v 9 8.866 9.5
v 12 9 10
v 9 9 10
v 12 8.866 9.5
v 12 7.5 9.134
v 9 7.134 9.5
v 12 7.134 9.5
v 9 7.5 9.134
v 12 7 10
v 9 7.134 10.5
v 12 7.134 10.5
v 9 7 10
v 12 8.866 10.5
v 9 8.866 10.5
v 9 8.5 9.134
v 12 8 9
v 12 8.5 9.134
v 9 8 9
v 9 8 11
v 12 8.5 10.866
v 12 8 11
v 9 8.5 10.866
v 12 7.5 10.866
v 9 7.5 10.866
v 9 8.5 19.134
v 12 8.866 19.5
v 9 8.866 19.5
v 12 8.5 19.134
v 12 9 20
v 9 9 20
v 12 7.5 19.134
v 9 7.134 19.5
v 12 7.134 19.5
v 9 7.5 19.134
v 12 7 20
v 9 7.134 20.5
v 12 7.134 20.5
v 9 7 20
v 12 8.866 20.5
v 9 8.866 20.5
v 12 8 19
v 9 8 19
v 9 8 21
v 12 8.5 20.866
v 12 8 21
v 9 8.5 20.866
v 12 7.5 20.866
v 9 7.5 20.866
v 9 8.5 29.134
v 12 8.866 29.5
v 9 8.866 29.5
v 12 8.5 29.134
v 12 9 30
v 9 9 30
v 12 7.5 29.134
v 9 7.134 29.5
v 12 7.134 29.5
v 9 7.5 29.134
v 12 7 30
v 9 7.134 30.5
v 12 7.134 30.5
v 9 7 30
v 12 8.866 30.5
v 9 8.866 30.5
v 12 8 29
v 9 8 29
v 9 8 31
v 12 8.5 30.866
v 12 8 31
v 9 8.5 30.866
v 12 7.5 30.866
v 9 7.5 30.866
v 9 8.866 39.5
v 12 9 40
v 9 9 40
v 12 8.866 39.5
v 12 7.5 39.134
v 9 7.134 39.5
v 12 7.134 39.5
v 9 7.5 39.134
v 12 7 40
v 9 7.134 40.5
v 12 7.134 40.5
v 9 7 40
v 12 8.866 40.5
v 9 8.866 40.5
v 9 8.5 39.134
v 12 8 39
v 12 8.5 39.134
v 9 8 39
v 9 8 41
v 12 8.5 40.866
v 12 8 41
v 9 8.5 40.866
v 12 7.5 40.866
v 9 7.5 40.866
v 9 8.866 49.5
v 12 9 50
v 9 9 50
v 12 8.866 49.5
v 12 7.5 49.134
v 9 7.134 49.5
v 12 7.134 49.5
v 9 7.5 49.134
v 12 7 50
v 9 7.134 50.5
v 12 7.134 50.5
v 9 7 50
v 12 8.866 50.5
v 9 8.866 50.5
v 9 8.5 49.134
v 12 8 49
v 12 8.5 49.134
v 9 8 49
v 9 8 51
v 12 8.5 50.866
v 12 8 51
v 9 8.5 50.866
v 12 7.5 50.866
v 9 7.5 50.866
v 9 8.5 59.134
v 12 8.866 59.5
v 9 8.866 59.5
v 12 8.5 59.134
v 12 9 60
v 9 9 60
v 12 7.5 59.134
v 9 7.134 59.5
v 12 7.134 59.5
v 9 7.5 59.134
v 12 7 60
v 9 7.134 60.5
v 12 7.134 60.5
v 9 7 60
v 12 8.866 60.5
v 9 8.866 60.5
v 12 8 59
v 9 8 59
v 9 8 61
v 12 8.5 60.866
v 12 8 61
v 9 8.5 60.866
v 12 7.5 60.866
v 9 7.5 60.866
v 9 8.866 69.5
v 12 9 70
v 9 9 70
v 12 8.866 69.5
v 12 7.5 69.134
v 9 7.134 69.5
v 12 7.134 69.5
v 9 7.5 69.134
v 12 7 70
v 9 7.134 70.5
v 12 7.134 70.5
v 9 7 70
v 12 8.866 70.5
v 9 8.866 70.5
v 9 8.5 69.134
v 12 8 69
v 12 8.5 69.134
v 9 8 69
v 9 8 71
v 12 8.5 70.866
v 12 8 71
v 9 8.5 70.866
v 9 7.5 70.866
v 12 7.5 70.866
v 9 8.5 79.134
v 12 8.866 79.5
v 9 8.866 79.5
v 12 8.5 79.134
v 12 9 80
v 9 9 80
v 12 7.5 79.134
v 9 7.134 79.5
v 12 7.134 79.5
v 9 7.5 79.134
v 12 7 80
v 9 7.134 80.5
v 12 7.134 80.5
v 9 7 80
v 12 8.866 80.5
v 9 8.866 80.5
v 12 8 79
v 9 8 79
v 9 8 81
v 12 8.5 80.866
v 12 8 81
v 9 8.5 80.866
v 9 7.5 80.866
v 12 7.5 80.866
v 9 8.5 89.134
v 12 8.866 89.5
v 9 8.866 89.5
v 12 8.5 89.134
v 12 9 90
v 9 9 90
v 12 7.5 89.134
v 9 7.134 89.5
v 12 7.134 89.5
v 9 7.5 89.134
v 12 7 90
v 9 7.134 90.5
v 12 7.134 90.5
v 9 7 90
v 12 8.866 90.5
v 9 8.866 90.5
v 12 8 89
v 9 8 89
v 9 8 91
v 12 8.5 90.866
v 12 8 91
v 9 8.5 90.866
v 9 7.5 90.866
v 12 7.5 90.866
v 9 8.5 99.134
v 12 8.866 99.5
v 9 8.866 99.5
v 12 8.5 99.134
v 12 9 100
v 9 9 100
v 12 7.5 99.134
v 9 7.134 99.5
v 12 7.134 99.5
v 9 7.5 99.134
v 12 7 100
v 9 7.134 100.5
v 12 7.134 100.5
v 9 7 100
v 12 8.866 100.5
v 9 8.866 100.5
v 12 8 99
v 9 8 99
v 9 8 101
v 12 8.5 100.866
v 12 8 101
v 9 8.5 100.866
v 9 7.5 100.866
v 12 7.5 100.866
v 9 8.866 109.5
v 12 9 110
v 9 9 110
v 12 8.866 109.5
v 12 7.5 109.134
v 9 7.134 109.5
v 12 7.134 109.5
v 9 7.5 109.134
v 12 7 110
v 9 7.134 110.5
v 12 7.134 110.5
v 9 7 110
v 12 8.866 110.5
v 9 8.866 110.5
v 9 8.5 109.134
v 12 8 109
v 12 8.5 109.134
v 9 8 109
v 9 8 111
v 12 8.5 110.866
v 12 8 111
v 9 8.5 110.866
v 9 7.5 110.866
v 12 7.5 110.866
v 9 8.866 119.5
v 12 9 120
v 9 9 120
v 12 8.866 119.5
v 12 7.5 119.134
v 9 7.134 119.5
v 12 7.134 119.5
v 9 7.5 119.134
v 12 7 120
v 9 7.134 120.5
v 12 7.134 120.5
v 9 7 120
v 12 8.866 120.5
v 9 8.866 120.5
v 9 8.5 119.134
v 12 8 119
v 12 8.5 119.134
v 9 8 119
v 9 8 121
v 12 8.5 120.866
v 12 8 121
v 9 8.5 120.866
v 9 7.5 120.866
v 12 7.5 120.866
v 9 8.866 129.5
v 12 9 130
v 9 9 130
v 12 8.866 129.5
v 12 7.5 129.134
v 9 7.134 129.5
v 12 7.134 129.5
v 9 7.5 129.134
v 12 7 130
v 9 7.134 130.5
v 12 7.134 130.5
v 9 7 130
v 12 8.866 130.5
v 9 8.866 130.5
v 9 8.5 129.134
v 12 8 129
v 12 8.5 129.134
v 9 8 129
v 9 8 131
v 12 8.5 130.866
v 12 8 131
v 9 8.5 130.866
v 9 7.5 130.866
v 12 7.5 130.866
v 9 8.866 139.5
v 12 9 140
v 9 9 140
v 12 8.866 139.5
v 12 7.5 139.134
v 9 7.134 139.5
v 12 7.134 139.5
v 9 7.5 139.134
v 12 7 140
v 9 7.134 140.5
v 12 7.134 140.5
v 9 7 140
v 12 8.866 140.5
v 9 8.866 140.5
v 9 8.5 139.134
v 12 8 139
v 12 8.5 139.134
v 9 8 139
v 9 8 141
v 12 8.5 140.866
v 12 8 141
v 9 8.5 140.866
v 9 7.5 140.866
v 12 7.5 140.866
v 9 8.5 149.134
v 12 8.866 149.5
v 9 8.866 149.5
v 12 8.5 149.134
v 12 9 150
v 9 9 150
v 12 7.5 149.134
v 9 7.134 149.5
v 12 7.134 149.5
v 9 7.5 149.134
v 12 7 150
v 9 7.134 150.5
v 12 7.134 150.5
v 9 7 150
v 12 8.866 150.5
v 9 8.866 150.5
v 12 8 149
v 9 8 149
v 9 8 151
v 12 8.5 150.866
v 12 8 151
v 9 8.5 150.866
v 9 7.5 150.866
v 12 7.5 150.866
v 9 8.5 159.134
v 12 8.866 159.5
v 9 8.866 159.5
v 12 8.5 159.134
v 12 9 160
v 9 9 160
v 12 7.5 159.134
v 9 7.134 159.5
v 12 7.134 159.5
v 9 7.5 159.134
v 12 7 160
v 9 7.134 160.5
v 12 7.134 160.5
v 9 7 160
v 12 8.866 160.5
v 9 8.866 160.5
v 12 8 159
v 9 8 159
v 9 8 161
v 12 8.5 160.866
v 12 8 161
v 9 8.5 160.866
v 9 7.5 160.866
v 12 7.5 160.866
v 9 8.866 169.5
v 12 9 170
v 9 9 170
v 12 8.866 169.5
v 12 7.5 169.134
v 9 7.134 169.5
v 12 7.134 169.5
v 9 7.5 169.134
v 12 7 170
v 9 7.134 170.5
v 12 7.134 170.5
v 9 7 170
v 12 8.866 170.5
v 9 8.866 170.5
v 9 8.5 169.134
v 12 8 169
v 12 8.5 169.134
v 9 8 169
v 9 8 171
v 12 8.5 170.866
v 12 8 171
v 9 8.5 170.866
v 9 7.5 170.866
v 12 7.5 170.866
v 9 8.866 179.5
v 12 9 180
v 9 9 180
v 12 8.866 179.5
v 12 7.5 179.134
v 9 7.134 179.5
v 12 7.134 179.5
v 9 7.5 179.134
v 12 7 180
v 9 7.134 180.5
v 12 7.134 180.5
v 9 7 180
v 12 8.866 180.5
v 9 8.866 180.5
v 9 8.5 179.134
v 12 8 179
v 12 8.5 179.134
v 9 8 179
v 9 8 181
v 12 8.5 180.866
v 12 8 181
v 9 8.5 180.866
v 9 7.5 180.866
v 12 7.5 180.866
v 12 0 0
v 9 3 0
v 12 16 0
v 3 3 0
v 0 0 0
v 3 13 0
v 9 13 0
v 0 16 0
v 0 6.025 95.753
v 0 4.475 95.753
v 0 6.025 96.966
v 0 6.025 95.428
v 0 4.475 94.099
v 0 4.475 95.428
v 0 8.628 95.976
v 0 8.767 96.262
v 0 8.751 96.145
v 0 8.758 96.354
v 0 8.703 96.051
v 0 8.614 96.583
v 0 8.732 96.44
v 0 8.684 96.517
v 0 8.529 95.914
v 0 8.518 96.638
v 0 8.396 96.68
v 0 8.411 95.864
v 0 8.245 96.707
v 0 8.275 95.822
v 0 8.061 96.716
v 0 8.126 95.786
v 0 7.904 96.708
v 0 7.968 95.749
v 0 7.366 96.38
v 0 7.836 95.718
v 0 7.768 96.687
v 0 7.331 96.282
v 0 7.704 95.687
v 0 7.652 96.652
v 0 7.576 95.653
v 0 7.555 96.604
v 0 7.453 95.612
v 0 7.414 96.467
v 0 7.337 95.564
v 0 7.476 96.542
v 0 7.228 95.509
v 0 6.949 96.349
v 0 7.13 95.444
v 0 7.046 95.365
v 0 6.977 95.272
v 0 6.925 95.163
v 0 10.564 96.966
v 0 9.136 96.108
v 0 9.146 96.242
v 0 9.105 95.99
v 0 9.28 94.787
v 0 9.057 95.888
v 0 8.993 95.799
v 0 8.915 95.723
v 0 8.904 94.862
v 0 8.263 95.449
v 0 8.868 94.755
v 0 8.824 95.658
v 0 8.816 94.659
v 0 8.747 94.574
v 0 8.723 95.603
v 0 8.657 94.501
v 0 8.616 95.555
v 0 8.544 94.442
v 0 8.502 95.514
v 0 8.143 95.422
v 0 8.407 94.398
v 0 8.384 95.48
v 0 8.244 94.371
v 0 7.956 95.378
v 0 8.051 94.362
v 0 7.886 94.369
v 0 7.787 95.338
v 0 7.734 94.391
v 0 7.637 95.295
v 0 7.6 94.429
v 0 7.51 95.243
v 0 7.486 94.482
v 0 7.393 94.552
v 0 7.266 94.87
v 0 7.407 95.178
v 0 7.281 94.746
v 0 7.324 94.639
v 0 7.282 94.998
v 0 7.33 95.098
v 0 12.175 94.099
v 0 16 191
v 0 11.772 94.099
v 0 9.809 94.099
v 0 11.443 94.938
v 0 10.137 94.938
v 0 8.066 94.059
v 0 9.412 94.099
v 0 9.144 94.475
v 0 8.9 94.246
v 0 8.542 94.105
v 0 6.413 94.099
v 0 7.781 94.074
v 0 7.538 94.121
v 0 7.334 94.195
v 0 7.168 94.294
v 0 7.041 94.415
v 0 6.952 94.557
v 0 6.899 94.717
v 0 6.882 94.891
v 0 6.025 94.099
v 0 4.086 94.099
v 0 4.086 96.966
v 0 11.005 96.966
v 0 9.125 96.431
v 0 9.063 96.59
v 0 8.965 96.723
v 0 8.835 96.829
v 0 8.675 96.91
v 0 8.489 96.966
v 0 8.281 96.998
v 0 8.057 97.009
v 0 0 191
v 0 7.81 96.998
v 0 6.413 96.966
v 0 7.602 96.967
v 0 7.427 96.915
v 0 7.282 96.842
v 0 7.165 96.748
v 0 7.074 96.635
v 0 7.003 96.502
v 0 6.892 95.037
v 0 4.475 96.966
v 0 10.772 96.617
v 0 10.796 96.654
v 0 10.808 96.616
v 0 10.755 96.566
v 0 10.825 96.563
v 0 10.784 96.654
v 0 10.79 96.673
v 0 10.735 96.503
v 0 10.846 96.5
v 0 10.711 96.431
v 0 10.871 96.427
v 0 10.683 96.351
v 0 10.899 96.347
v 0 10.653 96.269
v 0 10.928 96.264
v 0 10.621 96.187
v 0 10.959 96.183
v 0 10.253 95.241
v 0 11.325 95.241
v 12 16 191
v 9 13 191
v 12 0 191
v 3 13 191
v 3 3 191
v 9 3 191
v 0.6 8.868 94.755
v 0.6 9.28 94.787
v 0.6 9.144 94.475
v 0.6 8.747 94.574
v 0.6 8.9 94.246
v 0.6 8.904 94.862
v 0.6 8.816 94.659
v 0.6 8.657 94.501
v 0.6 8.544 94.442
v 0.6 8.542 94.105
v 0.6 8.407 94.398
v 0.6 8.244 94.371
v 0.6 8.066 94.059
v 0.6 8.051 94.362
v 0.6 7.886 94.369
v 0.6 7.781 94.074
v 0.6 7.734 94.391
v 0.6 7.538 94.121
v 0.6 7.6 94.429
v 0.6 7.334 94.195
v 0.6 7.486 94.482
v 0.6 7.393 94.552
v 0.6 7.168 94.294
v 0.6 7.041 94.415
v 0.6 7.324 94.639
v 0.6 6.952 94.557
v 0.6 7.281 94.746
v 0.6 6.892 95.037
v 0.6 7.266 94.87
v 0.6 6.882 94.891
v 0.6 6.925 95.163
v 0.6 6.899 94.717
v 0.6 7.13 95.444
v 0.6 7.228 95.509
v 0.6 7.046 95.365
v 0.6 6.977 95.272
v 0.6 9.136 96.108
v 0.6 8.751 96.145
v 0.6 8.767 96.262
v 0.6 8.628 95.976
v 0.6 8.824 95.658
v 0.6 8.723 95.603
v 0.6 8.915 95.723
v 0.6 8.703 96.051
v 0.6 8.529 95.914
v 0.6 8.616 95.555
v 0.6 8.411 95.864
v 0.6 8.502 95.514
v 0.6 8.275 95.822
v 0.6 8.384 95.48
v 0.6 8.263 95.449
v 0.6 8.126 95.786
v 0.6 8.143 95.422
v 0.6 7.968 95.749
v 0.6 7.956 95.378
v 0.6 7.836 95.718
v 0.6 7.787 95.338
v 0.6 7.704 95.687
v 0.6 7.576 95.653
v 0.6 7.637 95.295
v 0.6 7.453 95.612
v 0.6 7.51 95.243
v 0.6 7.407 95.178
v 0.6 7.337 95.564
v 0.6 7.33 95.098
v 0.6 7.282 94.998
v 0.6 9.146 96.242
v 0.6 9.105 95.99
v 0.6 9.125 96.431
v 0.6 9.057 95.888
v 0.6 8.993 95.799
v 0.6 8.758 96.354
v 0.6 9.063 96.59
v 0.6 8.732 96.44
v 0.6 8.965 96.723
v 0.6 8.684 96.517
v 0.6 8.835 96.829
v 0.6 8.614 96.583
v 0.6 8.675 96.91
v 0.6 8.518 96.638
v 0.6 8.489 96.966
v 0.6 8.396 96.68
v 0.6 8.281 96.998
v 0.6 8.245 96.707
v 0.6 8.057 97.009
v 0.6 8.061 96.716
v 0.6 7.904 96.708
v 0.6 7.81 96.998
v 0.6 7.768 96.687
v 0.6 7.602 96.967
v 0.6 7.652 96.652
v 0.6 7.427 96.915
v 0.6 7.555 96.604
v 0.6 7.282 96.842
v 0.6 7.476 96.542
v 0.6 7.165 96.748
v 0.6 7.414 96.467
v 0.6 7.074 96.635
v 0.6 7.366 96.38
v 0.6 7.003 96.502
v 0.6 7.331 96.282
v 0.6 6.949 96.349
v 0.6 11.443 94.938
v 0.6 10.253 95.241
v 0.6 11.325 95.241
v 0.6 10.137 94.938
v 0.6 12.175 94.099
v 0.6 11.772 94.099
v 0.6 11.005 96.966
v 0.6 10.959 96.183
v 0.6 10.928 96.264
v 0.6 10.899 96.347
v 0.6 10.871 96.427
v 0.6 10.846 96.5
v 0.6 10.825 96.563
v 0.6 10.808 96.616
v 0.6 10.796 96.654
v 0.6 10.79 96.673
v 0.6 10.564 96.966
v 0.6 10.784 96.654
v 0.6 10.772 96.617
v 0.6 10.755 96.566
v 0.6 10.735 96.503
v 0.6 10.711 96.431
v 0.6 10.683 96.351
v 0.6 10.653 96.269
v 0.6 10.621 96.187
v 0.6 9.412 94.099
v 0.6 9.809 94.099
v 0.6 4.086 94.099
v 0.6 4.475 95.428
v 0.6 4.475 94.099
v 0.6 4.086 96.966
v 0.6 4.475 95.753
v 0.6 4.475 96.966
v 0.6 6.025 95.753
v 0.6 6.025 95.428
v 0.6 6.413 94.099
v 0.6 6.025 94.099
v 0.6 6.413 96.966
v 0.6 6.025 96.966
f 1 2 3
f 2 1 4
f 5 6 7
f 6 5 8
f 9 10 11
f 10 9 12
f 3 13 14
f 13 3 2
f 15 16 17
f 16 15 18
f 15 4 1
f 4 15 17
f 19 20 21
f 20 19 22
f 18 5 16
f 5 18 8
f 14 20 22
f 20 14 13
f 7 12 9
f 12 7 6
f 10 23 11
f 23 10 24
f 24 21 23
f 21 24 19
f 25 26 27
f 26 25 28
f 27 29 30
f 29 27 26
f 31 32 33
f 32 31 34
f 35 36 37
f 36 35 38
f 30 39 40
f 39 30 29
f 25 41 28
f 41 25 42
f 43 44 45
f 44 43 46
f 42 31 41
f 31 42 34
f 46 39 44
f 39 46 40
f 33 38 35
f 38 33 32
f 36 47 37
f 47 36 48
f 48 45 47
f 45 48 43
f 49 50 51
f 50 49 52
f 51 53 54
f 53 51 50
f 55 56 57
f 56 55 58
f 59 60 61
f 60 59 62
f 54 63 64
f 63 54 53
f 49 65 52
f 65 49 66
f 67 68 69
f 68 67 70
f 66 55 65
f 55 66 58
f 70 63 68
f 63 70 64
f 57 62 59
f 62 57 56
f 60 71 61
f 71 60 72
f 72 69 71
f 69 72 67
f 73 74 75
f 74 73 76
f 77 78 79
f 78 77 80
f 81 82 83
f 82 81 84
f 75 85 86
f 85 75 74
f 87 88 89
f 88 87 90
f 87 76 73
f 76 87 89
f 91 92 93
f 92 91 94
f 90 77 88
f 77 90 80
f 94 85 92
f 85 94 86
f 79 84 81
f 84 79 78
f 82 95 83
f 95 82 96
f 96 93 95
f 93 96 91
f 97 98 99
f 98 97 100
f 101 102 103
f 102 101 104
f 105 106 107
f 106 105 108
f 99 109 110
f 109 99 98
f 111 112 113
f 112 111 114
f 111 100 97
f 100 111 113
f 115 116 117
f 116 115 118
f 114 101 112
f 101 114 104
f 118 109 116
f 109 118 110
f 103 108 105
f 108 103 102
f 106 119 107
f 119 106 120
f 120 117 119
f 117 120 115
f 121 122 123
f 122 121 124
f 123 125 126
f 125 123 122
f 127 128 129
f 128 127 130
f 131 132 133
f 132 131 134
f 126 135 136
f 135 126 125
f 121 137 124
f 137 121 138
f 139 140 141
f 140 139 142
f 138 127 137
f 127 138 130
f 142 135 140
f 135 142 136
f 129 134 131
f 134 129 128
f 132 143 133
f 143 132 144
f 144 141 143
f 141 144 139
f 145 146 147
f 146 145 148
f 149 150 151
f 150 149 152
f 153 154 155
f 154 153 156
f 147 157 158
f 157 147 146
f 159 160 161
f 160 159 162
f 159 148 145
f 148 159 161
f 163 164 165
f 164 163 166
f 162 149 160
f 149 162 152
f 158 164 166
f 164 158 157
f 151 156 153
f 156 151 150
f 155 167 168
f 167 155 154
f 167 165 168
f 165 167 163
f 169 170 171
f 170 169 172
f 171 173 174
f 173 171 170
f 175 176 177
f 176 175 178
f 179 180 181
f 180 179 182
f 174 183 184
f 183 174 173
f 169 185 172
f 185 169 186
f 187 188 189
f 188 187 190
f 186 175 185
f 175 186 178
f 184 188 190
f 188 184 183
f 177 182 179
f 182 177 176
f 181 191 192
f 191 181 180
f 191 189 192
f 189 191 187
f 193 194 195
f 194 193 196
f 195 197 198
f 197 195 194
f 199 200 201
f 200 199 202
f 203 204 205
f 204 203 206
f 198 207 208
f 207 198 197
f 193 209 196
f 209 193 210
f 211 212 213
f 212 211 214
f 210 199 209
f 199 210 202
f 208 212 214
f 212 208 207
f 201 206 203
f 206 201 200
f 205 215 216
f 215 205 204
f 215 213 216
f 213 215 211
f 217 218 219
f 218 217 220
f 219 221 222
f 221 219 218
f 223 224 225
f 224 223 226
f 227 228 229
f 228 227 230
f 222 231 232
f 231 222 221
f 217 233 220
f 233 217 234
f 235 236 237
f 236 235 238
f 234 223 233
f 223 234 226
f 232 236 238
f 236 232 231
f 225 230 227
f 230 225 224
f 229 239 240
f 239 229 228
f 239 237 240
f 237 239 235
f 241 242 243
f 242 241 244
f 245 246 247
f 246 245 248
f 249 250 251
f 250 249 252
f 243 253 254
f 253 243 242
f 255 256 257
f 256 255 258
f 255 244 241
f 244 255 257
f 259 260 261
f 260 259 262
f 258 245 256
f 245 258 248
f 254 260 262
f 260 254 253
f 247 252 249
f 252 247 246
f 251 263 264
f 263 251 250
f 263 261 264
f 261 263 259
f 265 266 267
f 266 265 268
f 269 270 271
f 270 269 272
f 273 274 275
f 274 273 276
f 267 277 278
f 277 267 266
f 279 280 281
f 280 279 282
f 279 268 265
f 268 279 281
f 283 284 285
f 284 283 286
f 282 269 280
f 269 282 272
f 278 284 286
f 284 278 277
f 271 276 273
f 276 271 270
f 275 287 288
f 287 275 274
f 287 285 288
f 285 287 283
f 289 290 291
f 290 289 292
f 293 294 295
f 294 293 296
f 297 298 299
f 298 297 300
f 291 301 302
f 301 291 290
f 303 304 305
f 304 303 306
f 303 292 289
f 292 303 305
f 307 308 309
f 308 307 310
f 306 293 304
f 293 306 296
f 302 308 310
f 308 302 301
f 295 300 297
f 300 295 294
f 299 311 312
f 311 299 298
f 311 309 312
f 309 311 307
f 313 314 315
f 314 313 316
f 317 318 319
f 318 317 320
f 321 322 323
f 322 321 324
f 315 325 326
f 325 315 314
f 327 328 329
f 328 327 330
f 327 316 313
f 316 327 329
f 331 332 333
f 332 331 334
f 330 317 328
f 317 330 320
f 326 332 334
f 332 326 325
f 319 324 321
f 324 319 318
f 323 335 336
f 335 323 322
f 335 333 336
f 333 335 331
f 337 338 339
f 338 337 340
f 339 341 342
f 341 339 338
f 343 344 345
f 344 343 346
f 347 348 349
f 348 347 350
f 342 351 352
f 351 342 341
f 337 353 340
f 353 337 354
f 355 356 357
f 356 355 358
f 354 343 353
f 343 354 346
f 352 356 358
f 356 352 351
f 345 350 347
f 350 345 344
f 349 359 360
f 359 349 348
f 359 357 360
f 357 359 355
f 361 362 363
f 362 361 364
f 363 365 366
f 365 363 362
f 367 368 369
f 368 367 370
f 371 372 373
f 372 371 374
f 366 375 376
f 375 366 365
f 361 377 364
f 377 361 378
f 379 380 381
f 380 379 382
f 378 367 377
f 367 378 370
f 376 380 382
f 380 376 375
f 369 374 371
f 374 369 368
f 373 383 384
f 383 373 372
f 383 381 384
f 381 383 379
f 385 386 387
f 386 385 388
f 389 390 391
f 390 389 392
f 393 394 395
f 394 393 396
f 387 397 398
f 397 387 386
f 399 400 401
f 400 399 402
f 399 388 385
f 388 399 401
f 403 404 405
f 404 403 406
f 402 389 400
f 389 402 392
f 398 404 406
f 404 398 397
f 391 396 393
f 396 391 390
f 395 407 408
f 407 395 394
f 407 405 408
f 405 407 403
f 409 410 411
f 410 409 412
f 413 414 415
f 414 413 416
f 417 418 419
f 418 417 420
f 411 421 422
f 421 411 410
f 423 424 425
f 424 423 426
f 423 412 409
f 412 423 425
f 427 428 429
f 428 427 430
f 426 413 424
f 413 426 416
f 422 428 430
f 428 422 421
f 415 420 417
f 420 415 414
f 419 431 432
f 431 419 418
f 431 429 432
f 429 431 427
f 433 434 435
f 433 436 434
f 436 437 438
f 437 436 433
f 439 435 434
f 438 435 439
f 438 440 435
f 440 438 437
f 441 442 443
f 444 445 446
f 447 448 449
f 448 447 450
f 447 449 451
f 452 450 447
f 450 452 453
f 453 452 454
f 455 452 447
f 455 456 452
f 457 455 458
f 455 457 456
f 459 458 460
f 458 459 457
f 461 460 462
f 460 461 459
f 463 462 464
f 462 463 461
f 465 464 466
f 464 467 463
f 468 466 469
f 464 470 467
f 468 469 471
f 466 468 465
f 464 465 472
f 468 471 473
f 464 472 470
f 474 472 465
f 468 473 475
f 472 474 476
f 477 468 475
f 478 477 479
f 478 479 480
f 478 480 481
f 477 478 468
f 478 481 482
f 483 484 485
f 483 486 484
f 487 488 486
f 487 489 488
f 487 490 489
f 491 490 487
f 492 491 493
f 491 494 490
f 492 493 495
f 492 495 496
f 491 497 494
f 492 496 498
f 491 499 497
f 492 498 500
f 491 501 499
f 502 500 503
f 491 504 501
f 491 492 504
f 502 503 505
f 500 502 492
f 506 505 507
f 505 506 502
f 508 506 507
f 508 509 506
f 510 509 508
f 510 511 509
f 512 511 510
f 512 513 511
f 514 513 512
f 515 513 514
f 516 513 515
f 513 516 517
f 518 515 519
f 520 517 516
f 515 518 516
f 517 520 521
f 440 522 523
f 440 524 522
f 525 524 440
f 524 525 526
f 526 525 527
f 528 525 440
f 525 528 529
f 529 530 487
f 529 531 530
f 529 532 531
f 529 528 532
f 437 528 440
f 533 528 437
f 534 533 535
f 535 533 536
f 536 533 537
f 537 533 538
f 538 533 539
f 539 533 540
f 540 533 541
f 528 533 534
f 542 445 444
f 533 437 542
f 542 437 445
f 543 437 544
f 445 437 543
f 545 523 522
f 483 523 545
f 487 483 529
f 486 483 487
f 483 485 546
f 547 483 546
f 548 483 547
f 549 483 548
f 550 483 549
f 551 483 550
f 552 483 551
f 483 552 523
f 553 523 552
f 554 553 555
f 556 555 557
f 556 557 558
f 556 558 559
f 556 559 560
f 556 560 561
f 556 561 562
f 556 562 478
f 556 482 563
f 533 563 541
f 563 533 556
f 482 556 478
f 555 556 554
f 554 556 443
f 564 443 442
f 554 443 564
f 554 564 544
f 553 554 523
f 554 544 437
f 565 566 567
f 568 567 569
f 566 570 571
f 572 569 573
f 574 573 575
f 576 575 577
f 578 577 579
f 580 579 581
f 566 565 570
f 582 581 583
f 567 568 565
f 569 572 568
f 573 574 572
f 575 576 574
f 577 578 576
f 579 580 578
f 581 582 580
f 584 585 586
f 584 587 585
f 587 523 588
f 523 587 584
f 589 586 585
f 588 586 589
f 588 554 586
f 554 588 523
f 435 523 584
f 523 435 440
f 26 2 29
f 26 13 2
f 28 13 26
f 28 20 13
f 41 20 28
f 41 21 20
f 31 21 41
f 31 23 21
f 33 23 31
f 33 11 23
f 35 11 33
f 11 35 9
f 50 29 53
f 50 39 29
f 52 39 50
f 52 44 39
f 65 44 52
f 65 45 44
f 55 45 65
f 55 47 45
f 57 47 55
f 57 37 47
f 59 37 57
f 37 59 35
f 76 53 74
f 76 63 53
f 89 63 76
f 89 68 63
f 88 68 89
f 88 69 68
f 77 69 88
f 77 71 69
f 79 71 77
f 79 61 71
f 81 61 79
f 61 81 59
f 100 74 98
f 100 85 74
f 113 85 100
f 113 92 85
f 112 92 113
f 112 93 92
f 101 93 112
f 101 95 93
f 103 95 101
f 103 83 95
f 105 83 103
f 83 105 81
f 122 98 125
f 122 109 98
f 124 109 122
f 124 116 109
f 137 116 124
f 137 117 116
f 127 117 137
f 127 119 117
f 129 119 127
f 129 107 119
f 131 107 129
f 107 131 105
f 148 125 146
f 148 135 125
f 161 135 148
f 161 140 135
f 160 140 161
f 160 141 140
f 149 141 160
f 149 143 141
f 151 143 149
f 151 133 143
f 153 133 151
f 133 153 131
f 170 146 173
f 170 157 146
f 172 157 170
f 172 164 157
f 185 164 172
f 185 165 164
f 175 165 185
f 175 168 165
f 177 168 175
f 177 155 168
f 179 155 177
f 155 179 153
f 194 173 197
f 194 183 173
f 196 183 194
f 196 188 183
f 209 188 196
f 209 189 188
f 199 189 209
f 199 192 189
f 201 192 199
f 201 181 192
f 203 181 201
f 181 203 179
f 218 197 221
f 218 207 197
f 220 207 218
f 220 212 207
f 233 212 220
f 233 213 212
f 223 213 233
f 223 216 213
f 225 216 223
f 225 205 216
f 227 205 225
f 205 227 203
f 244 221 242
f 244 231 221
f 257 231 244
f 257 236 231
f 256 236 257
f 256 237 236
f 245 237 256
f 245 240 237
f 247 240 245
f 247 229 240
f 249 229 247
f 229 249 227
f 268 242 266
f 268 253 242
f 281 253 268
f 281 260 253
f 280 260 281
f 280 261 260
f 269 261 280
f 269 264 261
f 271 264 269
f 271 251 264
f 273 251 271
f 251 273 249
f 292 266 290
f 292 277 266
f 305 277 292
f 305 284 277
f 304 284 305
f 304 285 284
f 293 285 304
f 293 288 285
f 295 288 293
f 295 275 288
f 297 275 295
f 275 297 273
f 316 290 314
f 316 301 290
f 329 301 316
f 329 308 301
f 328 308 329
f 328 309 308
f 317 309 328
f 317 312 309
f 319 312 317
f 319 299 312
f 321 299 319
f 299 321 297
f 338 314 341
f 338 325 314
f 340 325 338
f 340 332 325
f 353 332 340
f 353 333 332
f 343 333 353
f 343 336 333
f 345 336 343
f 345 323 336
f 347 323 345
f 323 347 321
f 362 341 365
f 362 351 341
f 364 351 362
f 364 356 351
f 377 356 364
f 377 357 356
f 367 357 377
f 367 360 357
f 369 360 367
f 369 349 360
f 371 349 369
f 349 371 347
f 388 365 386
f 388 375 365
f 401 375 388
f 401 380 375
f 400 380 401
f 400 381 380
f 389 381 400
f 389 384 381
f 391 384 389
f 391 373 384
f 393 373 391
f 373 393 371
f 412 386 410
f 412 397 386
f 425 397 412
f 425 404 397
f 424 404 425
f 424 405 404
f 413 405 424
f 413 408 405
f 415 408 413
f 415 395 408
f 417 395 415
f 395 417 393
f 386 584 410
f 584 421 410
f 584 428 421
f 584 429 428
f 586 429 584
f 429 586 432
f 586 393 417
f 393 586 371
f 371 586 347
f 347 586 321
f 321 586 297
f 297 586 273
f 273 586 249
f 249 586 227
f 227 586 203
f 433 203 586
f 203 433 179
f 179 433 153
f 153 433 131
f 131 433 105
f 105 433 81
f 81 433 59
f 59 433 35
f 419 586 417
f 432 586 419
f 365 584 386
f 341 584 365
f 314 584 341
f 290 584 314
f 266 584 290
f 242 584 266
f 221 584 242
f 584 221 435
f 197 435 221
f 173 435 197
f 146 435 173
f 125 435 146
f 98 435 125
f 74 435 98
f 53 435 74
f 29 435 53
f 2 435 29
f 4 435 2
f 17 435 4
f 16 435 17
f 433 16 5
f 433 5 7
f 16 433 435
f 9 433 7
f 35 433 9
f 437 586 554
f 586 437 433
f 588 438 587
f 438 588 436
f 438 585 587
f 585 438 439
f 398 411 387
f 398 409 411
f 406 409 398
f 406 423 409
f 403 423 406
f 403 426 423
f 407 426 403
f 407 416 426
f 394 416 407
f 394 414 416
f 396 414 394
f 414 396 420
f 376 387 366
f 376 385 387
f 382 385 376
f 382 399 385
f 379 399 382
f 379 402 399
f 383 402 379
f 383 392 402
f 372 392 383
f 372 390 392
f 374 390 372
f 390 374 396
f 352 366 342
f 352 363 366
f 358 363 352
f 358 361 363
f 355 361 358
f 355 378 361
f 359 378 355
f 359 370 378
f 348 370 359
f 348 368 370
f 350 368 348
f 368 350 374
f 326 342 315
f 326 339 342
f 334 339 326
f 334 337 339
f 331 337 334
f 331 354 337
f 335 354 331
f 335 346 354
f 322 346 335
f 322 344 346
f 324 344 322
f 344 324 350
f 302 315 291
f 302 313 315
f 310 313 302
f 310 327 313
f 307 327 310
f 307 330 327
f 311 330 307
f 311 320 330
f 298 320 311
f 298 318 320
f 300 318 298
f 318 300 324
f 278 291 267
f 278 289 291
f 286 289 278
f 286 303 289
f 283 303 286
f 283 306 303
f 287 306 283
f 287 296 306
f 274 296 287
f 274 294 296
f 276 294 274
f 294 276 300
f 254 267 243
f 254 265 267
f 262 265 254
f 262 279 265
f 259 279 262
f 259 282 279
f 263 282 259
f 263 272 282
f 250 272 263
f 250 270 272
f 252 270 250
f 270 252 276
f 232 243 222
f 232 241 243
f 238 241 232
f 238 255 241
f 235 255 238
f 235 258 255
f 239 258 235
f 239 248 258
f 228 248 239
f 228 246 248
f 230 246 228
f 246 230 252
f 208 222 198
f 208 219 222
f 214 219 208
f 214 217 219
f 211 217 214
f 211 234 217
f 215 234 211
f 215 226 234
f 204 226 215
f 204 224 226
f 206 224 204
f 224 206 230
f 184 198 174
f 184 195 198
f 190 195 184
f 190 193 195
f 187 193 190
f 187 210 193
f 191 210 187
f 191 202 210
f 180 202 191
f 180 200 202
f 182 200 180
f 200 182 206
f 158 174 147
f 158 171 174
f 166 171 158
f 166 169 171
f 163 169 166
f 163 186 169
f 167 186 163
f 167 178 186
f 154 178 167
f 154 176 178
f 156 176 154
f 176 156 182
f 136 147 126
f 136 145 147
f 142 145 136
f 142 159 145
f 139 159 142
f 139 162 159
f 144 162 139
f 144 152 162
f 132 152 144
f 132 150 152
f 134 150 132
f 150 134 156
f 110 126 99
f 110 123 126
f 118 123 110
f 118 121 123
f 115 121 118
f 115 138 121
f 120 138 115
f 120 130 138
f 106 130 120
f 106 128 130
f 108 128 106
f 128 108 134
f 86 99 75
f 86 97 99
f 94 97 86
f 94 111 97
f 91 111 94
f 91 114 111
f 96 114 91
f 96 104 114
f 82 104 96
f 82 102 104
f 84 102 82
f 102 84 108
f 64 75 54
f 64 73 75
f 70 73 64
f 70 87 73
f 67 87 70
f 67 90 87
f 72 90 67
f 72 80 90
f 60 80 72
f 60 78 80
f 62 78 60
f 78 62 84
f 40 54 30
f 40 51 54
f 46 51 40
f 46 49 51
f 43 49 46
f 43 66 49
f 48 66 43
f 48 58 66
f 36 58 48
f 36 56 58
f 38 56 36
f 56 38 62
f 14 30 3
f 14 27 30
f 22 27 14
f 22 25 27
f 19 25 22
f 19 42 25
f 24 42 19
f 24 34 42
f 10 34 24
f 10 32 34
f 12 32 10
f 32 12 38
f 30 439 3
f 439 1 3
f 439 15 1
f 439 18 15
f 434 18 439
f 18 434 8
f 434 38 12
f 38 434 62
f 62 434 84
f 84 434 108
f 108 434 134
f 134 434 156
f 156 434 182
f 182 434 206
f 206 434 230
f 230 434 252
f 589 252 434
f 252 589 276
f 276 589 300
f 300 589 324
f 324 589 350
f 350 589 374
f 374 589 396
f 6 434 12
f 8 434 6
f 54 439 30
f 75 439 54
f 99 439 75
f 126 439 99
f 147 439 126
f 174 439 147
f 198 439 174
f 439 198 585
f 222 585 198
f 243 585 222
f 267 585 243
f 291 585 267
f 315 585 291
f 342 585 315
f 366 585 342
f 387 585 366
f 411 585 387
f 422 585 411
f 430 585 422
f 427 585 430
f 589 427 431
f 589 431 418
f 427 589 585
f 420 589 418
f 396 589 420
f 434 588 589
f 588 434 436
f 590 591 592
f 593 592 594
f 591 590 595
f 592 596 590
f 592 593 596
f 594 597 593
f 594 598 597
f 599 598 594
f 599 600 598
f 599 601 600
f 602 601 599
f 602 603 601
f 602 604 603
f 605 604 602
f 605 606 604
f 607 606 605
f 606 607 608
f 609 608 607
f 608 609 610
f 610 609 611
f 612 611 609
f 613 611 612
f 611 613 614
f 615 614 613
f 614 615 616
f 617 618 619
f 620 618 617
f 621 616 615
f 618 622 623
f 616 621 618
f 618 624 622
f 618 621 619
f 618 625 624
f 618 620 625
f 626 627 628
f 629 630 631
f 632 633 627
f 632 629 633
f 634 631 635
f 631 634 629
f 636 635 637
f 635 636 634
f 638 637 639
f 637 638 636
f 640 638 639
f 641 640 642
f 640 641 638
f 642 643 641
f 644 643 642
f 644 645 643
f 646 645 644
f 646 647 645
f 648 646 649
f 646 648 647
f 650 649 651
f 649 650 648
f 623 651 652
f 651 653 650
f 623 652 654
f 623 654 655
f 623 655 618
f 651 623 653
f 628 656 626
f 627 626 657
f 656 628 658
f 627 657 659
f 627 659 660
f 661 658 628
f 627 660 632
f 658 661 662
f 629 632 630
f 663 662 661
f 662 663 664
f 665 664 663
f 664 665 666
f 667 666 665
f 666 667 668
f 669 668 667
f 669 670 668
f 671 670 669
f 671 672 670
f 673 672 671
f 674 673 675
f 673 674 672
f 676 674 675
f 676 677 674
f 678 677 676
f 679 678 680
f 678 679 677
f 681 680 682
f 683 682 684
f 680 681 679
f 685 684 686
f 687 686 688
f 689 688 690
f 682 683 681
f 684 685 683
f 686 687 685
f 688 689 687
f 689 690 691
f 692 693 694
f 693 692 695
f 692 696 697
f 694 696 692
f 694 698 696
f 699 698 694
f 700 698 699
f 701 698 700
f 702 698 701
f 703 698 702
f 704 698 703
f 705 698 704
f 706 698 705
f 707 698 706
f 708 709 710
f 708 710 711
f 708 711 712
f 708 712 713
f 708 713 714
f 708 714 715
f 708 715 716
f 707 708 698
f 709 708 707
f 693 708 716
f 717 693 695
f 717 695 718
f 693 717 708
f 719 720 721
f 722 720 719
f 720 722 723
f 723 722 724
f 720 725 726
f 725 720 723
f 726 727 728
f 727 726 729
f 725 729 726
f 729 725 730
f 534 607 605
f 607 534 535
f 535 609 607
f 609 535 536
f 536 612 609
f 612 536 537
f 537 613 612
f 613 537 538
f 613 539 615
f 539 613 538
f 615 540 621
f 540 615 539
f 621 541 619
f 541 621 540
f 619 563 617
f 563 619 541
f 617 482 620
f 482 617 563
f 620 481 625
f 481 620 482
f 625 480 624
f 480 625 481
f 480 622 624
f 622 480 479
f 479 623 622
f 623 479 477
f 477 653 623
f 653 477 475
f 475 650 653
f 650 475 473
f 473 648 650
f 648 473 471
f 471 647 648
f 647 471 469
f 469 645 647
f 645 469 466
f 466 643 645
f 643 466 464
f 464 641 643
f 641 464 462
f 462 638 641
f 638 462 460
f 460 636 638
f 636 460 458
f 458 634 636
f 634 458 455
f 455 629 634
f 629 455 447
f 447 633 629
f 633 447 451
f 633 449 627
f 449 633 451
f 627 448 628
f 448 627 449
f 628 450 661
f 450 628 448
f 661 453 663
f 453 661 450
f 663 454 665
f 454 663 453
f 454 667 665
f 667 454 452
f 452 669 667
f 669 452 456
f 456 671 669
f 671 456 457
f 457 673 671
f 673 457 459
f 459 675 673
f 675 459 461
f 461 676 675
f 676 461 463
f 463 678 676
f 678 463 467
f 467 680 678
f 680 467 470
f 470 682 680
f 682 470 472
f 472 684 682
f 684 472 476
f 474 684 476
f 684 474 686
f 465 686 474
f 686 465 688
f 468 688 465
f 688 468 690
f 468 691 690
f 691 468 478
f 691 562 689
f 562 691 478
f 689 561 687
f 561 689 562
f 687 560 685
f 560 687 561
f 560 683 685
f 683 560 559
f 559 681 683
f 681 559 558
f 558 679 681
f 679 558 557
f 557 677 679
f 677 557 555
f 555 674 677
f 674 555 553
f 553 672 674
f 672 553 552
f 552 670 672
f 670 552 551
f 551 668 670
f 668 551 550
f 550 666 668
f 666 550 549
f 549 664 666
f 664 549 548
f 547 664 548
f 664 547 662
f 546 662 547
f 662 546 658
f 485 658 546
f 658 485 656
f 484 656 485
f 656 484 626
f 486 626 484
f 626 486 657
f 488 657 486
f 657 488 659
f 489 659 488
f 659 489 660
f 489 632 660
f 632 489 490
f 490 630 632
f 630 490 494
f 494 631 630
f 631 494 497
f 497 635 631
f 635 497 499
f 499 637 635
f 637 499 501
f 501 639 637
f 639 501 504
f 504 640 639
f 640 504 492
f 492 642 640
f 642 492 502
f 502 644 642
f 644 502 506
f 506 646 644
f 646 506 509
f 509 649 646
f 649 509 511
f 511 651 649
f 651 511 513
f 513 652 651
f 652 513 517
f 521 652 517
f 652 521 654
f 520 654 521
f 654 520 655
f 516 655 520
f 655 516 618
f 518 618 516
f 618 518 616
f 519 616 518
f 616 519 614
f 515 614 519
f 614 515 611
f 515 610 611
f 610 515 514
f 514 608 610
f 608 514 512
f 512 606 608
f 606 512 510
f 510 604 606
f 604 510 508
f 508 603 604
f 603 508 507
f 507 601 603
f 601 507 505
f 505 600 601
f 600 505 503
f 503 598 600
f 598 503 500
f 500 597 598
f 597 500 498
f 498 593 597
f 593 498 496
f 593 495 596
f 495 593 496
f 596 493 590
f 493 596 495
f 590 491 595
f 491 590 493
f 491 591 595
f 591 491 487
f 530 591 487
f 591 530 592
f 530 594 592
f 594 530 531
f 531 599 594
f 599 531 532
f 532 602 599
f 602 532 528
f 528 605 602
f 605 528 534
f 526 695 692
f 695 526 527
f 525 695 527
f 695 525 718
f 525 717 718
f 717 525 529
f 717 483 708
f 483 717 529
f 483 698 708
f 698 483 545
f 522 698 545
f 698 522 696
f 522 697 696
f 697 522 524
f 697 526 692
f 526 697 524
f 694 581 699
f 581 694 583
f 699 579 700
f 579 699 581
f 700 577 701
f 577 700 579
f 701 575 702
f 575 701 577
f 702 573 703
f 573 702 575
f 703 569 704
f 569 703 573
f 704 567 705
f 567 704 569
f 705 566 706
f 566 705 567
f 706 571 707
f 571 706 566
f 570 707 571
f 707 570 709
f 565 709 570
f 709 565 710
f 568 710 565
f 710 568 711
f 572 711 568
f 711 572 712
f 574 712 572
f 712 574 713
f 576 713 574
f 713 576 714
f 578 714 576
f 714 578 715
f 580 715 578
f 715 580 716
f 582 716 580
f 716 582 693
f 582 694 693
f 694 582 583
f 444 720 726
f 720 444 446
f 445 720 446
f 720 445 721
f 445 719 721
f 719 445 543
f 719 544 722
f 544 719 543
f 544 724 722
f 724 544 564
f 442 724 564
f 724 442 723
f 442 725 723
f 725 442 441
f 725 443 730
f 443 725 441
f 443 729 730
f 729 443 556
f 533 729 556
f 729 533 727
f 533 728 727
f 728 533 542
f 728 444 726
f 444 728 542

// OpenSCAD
// file: ../../lib/emboss.scad
// cad/lib/emboss.scad
include <../generated/dims.scad>

module engrave(code, at, z, size = LABEL_SIZE, facing = -1, spin = 0) {
    if (facing < 0)
        translate([at[0] + LABEL_DEPTH, at[1], z]) rotate([90, 0, -90])
            linear_extrude(LABEL_DEPTH + 0.01) rotate(spin) text(code, size = size, halign = "center", valign = "center");
    else
        translate([at[0] - LABEL_DEPTH, at[1], z]) rotate([90, 0, 90])
            linear_extrude(LABEL_DEPTH + 0.01) rotate(-spin) text(code, size = size, halign = "center", valign = "center");
}
// file: ../dims.scad
MAX_SEG = 240.0;
JOINT_GAP = 1.0;
DEPTH = 63.0;
FRAME_W = 58.0;
FRAME_BODY = 40.0;
TRANSOM_W = 70.0;
TRANSOM_HALF_BODY = 17.0;
SASH_W = 51.0;
SASH_BODY = 33.0;
SASH_Y0 = 2.0;
SASH_GAP = 13.0;
STAY_W = 14.0;
SCREEN_W = 30.0;
SCREEN_DEPTH = 20.0;
SCREEN_OVERLAP = 10.0;
SCREEN_SHELL = 4.0;
GLASS_T = 24.0;
TWINWALL_T = 16.0;
GLASS_CLEAR = 3.0;
GASKET_T = 3.0;
GASKET_IN = 4.0;
GLASS_EDGE = 43.0;
TRANSOM_GLASS = 20.0;
SASH_GLASS = 36.0;
STOP_T = 8.0;
GLASS_Y0 = 11.0;
BEAD_W = 16.0;
BEAD_T = 10.0;
KEY_Y = 43.0;
KEY_D = 4.0;
KEY_H = 4.0;
KEY_LIP = 0.8;
KEY_THROAT = 1.2;
FIN_Y0 = 20.0;
FIN_Y1 = 28.0;
FIN_L = 8.0;
ISTOP_Y0 = 54.0;
FLANGE_Y1 = 17.0;
FLANGE_L = 11.0;
LIP_Y0 = 46.0;
LIP_Y1 = 52.0;
LIP_L = 8.0;
KERF_W = 3.0;
KERF_D = 5.0;
MAG_W = 13.0;
MAG_D = 2.0;
SPLINE_W = 4.0;
SPLINE_D = 5.0;
SPACER_W = 12.0;
ACRYLIC_T = 4.0;
SETTING_L = 100.0;
WEEP_CAP_H = 12.0;
WEEP_CAP_T = 1.5;
TUBE_FRAME = [20.0, 20.0];
TUBE_TRANSOM = [20.0, 40.0];
TUBE_SASH = [20.0, 20.0];
TUBE_SCREEN = [10.0, 10.0];
SOCKET_FRAME = 28.0;
SOCKET_SASH = 21.0;
SOCKET_SCREEN = 12.0;
TUBE_END_CLEAR = 1.5;
TUBE_CLEAR = 0.3;
MIN_SHELL = 6.0;
CHAMBER_WALL = 2.5;
MIN_SKIN = 1.5;
END_CAP = 4.0;
CORD_D = 3.0;
CORD_INSET = 1.5;
FIX_Y = 16.0;
FIX_Y_IN = 48.0;
FIX_DZ = 7.0;
FIX_D = 5.0;
FIX_CB_D = 10.0;
FIX_CB_L = 6.0;
FIX_BOSS_D = 15.0;
TUBE_SCREW_D = 4.2;
CSK_D = 8.6;
TRANSOM_SCREW_X = 39.0;
INSERT_M4_D = 5.6;
INSERT_M4_L = 8.0;
BOSS_PITCH = 24.0;
CAM_ALIGN_TOL = 1.0;
DOVE_W = 16.0;
DOVE_FLARE = 3.0;
DOVE_D = 6.0;
DOVE_CLEAR = 0.3;
LOCK_U = 3.0;
LOCK_D = 3.3;
LOCK_L = 22.0;
NODE_FIX_OFFSET = 25.0;
SHOE_WALL = 3.0;
HINGE_BOSS_X = 21.0;
CAM_BOSS_X = 47.0;
TRANSOM_MAG_X = 20.0;
LABEL_DEPTH = 0.6;
LABEL_SIZE = 5.0;
BEAD_LABEL = 3.0;
WEEP_W = 20.0;
WEEP_H = 5.0;
SILL_SLOPE_DEG = 8.0;
NOSE_KEY_X = 10.0;
NOSE_KEY_W = 6.0;
NOSE_KEY_D = 4.0;
NOSE_PROJECTION = 15.0;
MULLION_W = 70.0;
MULLION_HALF_BODY = 17.0;
MULLION_DOVE_D = 4.0;
VSLOT_SHIFT = 3.0;
VSLOT_MOUTH = 9.16;
VSLOT_NECK = 6.25;
VSLOT_LIP = 1.8;
VSLOT_FLOOR = 6.1;
VSLOT_SHOULDER = [5.6, 8.5];
VSLOT_TIP = [5.0, 5.8];
VSLOT_SCREW_D = 5.5;
VSLOT_CSK_D = 10.0;
VSLOT_M5_L = [10, 12, 16, 20, 25, 30, 35, 40];
VSLOT_TRANSOM_X = 41.25;
EDGE_R = 2.0;
JOINT_BEVEL = 0.8;
BEVEL_STEP = 0.2;
HANDLE_R = 3.0;
// file: ../../parts/acrylic_spacer.scad
// cad/parts/acrylic_spacer.scad
include <../generated/dims.scad>
use <../profile.scad>
use <../lib/emboss.scad>

function spacer_t(gap) = is_undef(gap) ? GLASS_T - 2 * ACRYLIC_T : gap;

module spacer_channel(gap) { rect(3, 3, SPACER_W - 3, spacer_t(gap) - 3); }

module acrylic_spacer(len, code, gap) {
    difference() {
        linear_extrude(len) rect(0, 0, SPACER_W, spacer_t(gap));
        translate([0, 0, -0.01]) linear_extrude(len + 0.02) spacer_channel(gap);
        for (z = [10 : 10 : len - 5])
            translate([SPACER_W - 3.5, spacer_t(gap) / 2, z]) rotate([0, 90, 0]) cylinder(d = 2, h = 4, $fn = 12);
        engrave(code, [0, spacer_t(gap) / 2], len / 2, 3);
    }
}

module acrylic_spacer_corner(code, gap) {
    leg = 15;
    plug = [SPACER_W - 6 - 0.3, spacer_t(gap) - 6 - 0.3];
    linear_extrude(spacer_t(gap)) square([SPACER_W, SPACER_W]);
    translate([SPACER_W, 3.15, 3.15]) cube([leg, plug[0], plug[1]]);
    translate([3.15, SPACER_W, 3.15]) cube([plug[0], leg, plug[1]]);
}
// main file
use <../../parts/acrylic_spacer.scad>
acrylic_spacer(191.0, "ASH");
